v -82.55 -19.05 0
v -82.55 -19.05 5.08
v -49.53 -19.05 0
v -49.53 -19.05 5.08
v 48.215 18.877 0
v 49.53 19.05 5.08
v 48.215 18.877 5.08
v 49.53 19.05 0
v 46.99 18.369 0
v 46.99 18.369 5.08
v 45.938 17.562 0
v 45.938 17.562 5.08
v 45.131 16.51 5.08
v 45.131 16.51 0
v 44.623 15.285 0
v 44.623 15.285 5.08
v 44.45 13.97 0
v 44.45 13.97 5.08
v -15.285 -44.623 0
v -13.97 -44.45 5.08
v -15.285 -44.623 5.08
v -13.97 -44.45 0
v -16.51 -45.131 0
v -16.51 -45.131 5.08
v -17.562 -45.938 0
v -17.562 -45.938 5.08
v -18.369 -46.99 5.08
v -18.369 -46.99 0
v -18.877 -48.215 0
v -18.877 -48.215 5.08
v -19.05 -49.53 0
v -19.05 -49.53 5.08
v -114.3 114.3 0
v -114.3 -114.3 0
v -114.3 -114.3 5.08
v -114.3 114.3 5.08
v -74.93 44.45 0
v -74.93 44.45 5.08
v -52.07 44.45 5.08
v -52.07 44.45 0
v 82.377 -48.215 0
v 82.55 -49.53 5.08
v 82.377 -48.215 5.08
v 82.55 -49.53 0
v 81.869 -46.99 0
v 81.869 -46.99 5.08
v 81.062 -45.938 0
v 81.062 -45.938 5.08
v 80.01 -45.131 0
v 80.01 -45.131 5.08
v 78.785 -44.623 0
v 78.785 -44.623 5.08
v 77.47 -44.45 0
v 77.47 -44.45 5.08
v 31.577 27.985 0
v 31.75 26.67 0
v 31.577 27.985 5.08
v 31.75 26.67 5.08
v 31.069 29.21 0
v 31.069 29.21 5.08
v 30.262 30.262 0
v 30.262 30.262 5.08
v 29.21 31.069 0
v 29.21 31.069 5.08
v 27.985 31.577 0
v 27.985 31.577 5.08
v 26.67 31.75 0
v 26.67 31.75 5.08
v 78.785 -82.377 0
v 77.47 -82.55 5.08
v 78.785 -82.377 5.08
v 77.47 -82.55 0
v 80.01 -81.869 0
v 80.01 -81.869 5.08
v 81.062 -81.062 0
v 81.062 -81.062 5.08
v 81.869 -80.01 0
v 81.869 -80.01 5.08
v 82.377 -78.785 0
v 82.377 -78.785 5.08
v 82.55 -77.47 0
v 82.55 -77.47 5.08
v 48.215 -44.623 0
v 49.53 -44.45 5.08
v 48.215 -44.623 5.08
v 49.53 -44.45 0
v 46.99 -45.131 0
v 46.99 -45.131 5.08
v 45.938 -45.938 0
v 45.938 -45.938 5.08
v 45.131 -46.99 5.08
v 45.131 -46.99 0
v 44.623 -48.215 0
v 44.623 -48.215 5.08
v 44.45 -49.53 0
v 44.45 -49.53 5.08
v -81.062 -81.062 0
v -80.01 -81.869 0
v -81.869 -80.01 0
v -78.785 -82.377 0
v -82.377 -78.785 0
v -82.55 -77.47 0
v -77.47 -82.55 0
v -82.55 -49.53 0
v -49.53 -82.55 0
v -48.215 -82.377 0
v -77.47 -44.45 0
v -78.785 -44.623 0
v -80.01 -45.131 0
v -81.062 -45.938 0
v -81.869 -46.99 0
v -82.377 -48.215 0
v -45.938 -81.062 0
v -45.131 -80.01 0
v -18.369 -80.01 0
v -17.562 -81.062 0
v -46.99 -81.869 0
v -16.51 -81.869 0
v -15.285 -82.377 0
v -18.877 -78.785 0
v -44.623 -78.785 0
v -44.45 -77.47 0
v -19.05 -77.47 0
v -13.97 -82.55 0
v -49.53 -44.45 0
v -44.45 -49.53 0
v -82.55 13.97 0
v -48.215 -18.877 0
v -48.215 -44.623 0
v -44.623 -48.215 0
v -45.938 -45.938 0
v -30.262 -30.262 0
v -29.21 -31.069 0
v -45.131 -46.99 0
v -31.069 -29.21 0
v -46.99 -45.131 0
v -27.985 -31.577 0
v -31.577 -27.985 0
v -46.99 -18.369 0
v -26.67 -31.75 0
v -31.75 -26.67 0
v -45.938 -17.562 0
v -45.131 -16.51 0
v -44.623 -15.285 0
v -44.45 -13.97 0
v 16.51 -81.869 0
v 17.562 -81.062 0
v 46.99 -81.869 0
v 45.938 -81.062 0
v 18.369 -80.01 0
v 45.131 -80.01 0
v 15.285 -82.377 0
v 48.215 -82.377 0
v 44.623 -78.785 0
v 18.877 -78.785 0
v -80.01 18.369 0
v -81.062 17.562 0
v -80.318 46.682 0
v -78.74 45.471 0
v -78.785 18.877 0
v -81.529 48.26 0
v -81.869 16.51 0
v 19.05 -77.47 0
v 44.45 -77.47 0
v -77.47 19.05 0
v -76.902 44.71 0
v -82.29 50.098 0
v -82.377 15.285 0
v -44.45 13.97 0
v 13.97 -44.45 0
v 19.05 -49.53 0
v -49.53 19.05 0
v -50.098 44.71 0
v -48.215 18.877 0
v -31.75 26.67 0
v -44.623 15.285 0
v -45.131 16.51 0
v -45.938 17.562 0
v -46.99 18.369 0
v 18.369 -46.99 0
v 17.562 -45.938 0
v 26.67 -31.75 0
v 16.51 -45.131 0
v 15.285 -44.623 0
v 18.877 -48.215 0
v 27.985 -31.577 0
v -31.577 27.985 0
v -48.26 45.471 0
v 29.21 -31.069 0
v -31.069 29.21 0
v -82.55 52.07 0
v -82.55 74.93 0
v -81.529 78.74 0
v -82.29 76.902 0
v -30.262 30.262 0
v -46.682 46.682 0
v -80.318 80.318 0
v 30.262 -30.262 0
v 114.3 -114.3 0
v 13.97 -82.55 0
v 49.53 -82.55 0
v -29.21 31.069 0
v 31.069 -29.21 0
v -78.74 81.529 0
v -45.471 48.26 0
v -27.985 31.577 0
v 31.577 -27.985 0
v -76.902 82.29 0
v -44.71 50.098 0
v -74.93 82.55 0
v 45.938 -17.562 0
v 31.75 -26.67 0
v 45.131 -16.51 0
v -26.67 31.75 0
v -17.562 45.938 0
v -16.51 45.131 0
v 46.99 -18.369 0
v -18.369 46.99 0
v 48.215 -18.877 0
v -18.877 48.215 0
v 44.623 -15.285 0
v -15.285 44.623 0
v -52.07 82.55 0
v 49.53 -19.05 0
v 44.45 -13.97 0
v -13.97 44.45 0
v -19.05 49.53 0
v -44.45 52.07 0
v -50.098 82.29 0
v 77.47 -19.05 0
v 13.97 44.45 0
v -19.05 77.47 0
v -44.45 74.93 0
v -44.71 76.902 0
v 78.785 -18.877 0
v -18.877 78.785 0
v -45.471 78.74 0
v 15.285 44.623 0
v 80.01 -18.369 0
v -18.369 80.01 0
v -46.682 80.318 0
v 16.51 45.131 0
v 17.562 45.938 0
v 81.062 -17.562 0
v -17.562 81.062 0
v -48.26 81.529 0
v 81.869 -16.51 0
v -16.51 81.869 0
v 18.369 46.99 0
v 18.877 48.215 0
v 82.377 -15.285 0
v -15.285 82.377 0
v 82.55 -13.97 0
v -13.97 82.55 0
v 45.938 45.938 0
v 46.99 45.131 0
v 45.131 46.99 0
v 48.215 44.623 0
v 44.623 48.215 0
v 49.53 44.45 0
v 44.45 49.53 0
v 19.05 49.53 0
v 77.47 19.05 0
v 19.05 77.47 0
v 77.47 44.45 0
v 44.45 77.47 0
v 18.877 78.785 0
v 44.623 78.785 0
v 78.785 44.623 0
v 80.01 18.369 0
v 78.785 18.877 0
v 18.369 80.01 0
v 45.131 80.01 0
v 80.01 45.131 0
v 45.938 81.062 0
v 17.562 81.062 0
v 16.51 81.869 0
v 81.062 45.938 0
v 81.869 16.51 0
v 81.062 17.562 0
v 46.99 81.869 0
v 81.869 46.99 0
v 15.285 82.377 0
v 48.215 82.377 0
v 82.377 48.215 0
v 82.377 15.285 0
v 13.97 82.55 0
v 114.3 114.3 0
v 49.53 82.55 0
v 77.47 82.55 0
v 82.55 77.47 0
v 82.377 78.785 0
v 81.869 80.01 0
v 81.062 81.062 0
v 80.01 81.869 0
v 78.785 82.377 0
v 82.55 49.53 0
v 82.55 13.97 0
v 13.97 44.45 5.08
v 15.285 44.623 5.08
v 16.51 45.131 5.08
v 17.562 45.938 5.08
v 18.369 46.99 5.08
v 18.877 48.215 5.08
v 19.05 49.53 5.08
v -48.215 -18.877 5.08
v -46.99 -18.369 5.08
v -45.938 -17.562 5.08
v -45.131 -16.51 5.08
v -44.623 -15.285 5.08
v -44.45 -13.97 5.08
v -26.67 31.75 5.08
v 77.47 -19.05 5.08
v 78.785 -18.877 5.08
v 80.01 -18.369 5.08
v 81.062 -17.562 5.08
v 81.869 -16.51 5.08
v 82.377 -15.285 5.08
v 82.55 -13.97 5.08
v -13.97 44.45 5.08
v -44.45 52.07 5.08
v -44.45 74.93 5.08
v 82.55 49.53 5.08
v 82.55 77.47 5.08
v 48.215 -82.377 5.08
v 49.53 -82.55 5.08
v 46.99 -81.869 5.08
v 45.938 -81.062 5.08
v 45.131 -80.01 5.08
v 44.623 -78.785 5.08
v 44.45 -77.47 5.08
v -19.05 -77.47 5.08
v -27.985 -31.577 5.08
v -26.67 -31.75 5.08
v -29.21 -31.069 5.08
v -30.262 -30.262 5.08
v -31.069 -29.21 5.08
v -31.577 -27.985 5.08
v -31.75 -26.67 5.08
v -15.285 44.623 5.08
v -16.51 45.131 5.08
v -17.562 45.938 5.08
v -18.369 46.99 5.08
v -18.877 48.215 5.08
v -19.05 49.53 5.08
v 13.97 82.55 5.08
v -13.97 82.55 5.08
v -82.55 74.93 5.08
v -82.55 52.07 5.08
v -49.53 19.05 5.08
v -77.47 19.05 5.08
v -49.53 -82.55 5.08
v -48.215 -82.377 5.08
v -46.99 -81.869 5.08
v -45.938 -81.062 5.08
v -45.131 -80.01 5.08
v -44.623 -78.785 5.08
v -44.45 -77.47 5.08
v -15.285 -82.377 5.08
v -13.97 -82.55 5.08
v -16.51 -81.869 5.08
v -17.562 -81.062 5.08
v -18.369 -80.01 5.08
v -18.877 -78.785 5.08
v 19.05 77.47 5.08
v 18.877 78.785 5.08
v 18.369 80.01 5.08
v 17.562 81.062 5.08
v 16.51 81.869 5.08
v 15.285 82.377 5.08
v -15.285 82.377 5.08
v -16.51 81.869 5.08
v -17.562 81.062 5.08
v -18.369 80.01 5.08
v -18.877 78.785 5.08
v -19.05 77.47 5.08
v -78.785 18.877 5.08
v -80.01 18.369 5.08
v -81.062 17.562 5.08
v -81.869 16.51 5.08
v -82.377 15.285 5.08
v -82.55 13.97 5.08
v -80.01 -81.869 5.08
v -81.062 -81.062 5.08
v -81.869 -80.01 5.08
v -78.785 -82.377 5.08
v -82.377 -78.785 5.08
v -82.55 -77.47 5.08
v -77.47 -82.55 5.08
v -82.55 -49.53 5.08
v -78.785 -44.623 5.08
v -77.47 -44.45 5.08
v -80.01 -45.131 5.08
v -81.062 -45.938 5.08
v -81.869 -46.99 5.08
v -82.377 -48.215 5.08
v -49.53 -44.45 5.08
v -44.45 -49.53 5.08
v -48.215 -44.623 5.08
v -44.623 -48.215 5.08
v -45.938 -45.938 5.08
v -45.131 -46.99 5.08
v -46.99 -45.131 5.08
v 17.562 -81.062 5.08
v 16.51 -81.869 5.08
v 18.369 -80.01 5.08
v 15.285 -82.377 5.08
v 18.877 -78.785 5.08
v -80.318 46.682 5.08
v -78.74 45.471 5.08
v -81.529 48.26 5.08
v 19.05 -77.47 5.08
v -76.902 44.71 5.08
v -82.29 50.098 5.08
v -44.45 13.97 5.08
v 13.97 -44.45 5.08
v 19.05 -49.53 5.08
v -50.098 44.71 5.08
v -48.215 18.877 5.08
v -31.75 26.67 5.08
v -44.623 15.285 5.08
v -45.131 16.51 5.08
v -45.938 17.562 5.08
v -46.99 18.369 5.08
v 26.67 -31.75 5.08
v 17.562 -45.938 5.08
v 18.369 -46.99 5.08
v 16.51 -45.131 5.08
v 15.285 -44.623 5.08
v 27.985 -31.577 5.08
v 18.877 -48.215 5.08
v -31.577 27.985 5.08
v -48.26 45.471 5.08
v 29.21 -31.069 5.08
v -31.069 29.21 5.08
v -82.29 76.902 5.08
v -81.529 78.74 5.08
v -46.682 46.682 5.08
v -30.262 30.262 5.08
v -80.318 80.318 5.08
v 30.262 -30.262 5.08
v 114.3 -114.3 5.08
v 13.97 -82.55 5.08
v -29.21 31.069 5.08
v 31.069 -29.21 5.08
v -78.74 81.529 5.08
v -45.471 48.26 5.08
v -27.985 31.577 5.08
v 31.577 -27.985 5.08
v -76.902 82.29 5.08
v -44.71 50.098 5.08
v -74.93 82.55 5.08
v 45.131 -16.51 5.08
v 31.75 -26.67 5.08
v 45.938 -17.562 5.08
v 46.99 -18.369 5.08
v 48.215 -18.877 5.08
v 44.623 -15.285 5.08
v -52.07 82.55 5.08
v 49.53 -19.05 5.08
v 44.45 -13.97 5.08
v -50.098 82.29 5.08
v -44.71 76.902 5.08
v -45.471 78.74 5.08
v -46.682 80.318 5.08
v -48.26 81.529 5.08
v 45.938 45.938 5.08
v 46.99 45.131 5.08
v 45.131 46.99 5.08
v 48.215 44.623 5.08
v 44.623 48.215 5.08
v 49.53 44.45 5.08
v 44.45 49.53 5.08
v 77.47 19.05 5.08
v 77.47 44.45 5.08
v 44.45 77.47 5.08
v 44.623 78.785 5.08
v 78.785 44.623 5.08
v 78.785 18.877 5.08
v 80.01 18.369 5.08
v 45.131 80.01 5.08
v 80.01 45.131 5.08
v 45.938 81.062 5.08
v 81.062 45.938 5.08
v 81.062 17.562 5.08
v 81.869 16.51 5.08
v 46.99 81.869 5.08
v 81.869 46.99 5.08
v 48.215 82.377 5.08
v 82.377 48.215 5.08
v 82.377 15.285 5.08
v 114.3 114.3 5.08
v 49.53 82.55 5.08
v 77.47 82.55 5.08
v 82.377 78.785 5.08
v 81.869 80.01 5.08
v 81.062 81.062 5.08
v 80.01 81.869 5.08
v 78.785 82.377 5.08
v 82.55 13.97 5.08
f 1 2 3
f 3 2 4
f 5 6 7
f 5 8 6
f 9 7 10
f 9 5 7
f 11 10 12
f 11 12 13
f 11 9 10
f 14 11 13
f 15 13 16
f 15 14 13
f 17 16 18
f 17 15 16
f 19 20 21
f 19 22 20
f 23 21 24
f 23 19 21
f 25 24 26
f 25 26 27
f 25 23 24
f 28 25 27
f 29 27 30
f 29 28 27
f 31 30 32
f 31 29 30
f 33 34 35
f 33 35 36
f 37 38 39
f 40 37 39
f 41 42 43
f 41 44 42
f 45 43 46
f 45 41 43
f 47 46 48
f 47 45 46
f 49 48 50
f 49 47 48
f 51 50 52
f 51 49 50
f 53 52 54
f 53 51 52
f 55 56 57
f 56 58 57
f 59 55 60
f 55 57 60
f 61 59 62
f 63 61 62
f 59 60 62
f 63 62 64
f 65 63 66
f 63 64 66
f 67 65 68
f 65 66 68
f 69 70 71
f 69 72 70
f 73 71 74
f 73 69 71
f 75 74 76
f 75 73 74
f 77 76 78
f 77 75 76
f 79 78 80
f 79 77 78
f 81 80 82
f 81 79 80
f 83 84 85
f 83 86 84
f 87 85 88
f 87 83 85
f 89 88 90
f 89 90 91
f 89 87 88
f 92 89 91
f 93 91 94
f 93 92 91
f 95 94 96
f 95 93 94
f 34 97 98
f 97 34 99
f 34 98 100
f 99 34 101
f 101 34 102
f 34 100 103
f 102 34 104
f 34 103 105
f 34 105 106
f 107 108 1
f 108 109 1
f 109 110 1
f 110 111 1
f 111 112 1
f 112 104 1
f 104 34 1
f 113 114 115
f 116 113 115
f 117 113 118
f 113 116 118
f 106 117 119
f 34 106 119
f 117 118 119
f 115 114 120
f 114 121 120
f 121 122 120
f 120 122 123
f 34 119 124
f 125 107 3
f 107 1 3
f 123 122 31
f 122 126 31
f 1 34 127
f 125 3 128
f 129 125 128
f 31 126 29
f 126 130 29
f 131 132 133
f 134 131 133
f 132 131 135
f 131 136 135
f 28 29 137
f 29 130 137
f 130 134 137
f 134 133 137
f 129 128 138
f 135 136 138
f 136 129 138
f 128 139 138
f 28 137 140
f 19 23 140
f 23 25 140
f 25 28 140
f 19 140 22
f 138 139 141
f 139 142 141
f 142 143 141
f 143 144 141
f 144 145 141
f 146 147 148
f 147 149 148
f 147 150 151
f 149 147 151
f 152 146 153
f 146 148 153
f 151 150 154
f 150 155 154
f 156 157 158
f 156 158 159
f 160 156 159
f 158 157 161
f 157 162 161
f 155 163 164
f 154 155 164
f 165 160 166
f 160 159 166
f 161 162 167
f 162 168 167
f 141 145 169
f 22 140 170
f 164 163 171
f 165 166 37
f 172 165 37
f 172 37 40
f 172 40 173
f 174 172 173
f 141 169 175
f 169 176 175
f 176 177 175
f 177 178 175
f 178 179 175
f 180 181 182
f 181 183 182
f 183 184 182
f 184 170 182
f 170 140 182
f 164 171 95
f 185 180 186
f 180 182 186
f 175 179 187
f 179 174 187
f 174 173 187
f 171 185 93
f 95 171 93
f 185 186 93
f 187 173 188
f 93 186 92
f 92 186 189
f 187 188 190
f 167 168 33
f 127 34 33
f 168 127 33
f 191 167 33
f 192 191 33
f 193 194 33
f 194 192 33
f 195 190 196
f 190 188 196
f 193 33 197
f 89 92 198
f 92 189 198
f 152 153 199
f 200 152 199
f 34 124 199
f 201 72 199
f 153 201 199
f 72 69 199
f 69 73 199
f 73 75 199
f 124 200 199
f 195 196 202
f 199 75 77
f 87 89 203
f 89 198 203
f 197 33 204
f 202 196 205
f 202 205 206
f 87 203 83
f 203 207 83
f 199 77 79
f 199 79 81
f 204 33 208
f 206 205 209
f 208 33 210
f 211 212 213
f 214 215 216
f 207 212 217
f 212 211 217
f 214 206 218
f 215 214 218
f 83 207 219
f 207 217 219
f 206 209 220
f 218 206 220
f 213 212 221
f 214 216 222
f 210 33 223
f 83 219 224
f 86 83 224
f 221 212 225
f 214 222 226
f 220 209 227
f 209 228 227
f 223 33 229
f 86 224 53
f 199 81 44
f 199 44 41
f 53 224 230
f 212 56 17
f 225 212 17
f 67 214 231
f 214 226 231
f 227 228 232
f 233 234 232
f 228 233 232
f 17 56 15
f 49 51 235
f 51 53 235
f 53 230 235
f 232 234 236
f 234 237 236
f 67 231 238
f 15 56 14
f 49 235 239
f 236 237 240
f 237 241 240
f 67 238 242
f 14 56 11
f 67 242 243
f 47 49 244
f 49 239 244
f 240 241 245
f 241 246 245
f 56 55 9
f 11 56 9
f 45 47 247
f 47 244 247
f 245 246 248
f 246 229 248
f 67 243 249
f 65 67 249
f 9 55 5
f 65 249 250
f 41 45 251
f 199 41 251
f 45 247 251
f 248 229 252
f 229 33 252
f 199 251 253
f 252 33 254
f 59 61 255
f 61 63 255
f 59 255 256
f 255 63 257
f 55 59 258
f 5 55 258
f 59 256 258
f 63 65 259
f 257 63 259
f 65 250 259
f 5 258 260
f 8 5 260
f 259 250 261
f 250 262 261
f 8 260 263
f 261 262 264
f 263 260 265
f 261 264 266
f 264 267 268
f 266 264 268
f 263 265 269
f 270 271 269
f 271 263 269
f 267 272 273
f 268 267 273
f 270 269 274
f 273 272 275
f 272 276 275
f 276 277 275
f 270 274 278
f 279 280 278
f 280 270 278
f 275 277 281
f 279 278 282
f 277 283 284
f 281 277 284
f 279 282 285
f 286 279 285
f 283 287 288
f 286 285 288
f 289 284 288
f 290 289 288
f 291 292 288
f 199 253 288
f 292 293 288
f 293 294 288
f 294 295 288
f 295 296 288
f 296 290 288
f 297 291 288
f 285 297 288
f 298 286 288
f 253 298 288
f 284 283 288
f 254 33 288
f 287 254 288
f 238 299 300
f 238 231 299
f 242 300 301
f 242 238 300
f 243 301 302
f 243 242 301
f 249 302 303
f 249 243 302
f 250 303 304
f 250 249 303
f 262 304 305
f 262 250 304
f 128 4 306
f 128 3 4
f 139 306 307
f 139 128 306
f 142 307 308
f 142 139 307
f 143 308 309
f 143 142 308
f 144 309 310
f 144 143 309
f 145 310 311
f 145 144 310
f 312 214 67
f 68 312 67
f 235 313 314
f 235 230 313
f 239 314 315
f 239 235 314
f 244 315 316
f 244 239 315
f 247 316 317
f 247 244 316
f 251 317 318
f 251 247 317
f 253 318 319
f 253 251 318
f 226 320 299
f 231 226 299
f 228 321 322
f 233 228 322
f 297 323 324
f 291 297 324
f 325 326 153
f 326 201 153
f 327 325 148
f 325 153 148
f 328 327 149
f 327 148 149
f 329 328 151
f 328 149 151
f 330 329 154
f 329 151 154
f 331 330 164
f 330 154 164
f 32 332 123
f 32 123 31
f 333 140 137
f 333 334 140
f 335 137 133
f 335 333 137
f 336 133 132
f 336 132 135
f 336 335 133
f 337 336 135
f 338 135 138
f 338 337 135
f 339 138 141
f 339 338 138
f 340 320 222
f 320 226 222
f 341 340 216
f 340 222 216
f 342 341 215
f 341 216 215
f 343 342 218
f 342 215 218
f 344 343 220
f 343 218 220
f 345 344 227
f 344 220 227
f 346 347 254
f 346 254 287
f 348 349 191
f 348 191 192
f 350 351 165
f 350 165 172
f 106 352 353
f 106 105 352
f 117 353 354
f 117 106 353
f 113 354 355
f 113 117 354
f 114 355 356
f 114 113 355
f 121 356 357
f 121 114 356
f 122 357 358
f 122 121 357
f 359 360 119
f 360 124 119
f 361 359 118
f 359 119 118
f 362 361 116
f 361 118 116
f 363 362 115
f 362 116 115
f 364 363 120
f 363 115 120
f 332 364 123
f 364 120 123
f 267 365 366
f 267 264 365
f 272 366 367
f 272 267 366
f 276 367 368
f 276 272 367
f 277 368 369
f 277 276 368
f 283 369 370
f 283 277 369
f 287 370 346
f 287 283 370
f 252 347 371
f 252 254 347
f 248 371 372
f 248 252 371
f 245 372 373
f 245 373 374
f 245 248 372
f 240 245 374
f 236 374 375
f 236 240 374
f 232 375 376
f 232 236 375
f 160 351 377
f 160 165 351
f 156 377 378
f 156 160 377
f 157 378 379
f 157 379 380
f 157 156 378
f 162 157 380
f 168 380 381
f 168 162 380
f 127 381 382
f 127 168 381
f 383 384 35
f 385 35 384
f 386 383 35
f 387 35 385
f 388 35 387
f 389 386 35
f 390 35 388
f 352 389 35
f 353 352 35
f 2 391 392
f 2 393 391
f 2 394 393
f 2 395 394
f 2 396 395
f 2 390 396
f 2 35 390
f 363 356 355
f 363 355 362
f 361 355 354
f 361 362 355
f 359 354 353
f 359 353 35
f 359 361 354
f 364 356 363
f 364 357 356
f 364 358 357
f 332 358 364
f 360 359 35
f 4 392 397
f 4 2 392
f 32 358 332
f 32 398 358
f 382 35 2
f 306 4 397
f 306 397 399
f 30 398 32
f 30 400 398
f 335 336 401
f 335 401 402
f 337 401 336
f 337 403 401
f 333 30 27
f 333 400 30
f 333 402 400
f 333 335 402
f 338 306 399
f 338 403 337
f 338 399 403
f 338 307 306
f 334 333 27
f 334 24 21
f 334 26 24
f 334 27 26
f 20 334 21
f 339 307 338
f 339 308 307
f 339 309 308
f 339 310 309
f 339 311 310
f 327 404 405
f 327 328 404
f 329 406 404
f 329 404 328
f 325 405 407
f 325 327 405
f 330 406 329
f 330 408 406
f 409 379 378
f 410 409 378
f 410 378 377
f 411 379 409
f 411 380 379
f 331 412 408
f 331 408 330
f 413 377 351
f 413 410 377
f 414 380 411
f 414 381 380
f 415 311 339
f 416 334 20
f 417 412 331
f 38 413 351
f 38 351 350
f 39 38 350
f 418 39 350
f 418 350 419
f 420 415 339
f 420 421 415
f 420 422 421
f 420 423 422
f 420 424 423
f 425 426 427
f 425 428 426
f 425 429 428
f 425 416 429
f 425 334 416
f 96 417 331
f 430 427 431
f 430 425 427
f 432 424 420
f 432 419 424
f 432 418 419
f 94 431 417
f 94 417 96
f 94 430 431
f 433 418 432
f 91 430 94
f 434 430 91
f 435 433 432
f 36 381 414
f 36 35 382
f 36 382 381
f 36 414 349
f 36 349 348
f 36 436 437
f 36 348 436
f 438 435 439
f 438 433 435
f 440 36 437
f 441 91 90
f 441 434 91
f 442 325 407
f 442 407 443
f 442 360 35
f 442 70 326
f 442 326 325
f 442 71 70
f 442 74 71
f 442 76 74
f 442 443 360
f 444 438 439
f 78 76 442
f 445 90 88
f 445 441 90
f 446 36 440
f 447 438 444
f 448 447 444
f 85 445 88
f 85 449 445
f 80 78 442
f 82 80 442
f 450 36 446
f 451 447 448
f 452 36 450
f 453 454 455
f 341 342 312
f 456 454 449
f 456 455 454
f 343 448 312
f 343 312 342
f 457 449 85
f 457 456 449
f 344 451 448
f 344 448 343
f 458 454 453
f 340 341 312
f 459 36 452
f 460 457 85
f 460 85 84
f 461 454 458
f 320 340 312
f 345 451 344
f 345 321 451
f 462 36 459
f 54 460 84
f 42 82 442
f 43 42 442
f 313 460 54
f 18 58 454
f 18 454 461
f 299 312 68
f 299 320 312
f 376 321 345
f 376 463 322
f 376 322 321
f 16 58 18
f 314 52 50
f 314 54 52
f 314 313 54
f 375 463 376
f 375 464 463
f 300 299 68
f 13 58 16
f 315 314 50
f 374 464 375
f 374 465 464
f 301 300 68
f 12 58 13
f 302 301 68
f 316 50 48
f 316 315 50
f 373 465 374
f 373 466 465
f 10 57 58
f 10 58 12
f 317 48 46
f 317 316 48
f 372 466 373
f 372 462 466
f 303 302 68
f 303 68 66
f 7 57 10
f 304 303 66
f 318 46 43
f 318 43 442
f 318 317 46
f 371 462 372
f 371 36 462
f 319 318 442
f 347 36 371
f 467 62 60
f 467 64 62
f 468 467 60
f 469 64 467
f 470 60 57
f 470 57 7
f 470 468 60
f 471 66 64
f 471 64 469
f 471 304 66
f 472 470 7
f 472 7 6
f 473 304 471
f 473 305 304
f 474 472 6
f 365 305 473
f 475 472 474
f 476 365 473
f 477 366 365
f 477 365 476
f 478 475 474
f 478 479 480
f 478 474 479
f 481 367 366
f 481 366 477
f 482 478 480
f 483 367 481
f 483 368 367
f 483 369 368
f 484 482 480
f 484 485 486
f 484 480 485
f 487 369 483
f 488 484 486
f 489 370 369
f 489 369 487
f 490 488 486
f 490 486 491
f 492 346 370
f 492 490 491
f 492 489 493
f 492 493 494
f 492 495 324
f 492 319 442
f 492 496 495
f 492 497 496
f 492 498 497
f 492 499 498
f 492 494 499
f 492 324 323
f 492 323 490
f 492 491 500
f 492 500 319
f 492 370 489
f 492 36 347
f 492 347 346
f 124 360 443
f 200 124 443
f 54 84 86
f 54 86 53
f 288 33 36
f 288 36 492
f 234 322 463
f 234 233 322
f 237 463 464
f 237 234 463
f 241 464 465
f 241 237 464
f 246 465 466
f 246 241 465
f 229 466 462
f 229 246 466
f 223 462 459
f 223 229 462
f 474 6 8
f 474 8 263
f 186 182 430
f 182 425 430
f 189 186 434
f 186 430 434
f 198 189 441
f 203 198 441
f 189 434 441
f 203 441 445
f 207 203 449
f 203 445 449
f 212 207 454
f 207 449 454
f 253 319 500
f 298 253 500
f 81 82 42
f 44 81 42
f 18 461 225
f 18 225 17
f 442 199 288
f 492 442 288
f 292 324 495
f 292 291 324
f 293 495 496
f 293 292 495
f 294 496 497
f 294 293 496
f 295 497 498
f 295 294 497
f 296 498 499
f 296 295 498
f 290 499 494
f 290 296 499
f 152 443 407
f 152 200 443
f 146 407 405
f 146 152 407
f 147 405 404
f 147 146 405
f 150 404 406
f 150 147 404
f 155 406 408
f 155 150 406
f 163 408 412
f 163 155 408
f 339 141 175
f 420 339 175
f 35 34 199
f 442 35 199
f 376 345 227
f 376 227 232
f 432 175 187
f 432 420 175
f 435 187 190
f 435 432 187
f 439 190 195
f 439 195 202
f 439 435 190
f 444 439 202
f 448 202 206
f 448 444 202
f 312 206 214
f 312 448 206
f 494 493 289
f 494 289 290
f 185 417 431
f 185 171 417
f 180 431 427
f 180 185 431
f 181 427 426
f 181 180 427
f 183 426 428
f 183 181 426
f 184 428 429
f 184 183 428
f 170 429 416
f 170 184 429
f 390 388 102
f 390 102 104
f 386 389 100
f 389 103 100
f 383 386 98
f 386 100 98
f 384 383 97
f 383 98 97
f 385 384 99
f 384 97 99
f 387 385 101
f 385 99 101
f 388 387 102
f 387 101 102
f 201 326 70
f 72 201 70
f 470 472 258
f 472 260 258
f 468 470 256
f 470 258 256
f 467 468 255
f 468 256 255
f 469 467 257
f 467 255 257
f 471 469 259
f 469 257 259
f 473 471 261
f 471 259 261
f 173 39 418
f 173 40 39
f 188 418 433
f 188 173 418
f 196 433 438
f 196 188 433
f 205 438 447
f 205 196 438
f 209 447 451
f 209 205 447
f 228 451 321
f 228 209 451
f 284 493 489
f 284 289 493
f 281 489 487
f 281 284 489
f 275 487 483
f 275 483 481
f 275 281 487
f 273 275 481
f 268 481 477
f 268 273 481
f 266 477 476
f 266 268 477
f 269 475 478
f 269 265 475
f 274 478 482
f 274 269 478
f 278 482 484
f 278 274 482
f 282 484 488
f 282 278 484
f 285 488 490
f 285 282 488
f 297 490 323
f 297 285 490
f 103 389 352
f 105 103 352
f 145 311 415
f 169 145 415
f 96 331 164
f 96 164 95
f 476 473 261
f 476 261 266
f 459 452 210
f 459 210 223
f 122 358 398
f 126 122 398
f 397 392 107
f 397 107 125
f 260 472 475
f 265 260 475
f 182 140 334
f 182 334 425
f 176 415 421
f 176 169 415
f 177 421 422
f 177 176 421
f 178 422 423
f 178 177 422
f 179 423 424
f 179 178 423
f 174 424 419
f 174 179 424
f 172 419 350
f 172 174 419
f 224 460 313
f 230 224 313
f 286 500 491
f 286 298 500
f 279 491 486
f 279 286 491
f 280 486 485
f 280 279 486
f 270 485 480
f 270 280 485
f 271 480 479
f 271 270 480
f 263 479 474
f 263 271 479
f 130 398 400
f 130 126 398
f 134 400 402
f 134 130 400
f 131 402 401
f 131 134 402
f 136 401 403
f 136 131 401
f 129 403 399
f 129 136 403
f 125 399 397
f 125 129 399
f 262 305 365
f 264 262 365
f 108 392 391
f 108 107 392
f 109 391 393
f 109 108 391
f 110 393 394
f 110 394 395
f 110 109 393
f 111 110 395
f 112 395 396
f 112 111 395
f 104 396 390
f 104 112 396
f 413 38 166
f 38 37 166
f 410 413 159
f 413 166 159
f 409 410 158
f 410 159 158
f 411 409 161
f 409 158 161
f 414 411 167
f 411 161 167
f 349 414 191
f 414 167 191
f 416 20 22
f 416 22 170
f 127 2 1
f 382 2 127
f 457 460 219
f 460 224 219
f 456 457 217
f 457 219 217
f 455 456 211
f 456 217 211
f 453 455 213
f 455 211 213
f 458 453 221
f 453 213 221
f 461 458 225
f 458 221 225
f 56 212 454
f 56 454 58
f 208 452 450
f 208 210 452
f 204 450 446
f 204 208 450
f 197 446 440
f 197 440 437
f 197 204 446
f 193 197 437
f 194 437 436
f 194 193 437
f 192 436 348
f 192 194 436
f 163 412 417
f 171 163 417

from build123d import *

# Parameters (mm, degrees)
F0_W     = 228.6
F0_H     = 228.6
F0_W_2   = 63.5
F0_H_2   = 63.5
F1_DEPTH = 5.08
F2_W     = 38.1
F2_H     = 38.1
F3_DEPTH = 25.4
F4_R     = 7.62
F5_W     = 38.1
F5_H     = 38.1
F6_DEPTH = 25.4
F7_R     = 5.08
F8_R     = 5.08


with BuildPart() as f1:
    # F0 (on Top) → F1 (new body)
    with BuildSketch(Plane.XY):
        Rectangle(F0_W, F0_H)
        Rectangle(F0_W_2, F0_H_2, mode=Mode.SUBTRACT)
    extrude(amount=F1_DEPTH)

    # F2 (on face) → F3 (cut)
    with BuildSketch(Plane.XY.offset(5.08)):
        with Locations((-63.5, 63.5)):
            Rectangle(F2_W, F2_H)
    extrude(amount=-F3_DEPTH, mode=Mode.SUBTRACT)

    # F4
    f4_edges = [f1.edges().sort_by_distance(p)[0] for p in [
        (-82.55, 82.55, 2.54),
        (-44.45, 82.55, 2.54),
        (-44.45, 44.45, 2.54),
        (-82.55, 44.45, 2.54),
    ]]
    fillet(f4_edges, radius=F4_R)

    # F5 (on face) → F6 (cut)
    with BuildSketch(Plane.XY.offset(5.08)):
        with Locations((-63.5, 0)):
            Rectangle(F5_W, F5_H)
        with Locations((0, 63.5)):
            Rectangle(F5_W, F5_H)
        with Locations((63.5, 63.5)):
            Rectangle(F5_W, F5_H)
        with Locations((63.5, 0)):
            Rectangle(F5_W, F5_H)
        with Locations((63.5, -63.5)):
            Rectangle(F5_W, F5_H)
        with Locations((0, -63.5)):
            Rectangle(F5_W, F5_H)
        with Locations((-63.5, -63.5)):
            Rectangle(F5_W, F5_H)
    extrude(amount=-F6_DEPTH, mode=Mode.SUBTRACT)

    # F7
    f7_edges = [f1.edges().sort_by_distance(p)[0] for p in [
        (-82.55, 19.05, 2.54),
        (-82.55, -44.45, 2.54),
        (-31.75, 31.75, 2.54),
        (-19.05, 82.55, 2.54),
        (44.45, 19.05, 2.54),
        (44.45, 82.55, 2.54),
        (44.45, -44.45, 2.54),
        (-19.05, -44.45, 2.54),
        (82.55, 82.55, 2.54),
        (82.55, 19.05, 2.54),
        (82.55, -44.45, 2.54),
        (19.05, -44.45, 2.54),
        (31.75, 31.75, 2.54),
        (-44.45, -44.45, 2.54),
        (-44.45, 19.05, 2.54),
        (19.05, 82.55, 2.54),
        (19.05, 44.45, 2.54),
        (82.55, -19.05, 2.54),
        (82.55, -82.55, 2.54),
        (19.05, -82.55, 2.54),
        (-44.45, -82.55, 2.54),
        (-44.45, -19.05, 2.54),
        (31.75, -31.75, 2.54),
        (-82.55, -82.55, 2.54),
        (-19.05, -82.55, 2.54),
        (44.45, -82.55, 2.54),
        (44.45, -19.05, 2.54),
        (44.45, 44.45, 2.54),
        (-19.05, 44.45, 2.54),
        (82.55, 44.45, 2.54),
    ]]
    fillet(f7_edges, radius=F7_R)

    # F8
    f8_edges = [f1.edges().sort_by_distance(p)[0] for p in [
        (-31.75, -31.75, 2.54),
    ]]
    fillet(f8_edges, radius=F8_R)


solid = f1.part
